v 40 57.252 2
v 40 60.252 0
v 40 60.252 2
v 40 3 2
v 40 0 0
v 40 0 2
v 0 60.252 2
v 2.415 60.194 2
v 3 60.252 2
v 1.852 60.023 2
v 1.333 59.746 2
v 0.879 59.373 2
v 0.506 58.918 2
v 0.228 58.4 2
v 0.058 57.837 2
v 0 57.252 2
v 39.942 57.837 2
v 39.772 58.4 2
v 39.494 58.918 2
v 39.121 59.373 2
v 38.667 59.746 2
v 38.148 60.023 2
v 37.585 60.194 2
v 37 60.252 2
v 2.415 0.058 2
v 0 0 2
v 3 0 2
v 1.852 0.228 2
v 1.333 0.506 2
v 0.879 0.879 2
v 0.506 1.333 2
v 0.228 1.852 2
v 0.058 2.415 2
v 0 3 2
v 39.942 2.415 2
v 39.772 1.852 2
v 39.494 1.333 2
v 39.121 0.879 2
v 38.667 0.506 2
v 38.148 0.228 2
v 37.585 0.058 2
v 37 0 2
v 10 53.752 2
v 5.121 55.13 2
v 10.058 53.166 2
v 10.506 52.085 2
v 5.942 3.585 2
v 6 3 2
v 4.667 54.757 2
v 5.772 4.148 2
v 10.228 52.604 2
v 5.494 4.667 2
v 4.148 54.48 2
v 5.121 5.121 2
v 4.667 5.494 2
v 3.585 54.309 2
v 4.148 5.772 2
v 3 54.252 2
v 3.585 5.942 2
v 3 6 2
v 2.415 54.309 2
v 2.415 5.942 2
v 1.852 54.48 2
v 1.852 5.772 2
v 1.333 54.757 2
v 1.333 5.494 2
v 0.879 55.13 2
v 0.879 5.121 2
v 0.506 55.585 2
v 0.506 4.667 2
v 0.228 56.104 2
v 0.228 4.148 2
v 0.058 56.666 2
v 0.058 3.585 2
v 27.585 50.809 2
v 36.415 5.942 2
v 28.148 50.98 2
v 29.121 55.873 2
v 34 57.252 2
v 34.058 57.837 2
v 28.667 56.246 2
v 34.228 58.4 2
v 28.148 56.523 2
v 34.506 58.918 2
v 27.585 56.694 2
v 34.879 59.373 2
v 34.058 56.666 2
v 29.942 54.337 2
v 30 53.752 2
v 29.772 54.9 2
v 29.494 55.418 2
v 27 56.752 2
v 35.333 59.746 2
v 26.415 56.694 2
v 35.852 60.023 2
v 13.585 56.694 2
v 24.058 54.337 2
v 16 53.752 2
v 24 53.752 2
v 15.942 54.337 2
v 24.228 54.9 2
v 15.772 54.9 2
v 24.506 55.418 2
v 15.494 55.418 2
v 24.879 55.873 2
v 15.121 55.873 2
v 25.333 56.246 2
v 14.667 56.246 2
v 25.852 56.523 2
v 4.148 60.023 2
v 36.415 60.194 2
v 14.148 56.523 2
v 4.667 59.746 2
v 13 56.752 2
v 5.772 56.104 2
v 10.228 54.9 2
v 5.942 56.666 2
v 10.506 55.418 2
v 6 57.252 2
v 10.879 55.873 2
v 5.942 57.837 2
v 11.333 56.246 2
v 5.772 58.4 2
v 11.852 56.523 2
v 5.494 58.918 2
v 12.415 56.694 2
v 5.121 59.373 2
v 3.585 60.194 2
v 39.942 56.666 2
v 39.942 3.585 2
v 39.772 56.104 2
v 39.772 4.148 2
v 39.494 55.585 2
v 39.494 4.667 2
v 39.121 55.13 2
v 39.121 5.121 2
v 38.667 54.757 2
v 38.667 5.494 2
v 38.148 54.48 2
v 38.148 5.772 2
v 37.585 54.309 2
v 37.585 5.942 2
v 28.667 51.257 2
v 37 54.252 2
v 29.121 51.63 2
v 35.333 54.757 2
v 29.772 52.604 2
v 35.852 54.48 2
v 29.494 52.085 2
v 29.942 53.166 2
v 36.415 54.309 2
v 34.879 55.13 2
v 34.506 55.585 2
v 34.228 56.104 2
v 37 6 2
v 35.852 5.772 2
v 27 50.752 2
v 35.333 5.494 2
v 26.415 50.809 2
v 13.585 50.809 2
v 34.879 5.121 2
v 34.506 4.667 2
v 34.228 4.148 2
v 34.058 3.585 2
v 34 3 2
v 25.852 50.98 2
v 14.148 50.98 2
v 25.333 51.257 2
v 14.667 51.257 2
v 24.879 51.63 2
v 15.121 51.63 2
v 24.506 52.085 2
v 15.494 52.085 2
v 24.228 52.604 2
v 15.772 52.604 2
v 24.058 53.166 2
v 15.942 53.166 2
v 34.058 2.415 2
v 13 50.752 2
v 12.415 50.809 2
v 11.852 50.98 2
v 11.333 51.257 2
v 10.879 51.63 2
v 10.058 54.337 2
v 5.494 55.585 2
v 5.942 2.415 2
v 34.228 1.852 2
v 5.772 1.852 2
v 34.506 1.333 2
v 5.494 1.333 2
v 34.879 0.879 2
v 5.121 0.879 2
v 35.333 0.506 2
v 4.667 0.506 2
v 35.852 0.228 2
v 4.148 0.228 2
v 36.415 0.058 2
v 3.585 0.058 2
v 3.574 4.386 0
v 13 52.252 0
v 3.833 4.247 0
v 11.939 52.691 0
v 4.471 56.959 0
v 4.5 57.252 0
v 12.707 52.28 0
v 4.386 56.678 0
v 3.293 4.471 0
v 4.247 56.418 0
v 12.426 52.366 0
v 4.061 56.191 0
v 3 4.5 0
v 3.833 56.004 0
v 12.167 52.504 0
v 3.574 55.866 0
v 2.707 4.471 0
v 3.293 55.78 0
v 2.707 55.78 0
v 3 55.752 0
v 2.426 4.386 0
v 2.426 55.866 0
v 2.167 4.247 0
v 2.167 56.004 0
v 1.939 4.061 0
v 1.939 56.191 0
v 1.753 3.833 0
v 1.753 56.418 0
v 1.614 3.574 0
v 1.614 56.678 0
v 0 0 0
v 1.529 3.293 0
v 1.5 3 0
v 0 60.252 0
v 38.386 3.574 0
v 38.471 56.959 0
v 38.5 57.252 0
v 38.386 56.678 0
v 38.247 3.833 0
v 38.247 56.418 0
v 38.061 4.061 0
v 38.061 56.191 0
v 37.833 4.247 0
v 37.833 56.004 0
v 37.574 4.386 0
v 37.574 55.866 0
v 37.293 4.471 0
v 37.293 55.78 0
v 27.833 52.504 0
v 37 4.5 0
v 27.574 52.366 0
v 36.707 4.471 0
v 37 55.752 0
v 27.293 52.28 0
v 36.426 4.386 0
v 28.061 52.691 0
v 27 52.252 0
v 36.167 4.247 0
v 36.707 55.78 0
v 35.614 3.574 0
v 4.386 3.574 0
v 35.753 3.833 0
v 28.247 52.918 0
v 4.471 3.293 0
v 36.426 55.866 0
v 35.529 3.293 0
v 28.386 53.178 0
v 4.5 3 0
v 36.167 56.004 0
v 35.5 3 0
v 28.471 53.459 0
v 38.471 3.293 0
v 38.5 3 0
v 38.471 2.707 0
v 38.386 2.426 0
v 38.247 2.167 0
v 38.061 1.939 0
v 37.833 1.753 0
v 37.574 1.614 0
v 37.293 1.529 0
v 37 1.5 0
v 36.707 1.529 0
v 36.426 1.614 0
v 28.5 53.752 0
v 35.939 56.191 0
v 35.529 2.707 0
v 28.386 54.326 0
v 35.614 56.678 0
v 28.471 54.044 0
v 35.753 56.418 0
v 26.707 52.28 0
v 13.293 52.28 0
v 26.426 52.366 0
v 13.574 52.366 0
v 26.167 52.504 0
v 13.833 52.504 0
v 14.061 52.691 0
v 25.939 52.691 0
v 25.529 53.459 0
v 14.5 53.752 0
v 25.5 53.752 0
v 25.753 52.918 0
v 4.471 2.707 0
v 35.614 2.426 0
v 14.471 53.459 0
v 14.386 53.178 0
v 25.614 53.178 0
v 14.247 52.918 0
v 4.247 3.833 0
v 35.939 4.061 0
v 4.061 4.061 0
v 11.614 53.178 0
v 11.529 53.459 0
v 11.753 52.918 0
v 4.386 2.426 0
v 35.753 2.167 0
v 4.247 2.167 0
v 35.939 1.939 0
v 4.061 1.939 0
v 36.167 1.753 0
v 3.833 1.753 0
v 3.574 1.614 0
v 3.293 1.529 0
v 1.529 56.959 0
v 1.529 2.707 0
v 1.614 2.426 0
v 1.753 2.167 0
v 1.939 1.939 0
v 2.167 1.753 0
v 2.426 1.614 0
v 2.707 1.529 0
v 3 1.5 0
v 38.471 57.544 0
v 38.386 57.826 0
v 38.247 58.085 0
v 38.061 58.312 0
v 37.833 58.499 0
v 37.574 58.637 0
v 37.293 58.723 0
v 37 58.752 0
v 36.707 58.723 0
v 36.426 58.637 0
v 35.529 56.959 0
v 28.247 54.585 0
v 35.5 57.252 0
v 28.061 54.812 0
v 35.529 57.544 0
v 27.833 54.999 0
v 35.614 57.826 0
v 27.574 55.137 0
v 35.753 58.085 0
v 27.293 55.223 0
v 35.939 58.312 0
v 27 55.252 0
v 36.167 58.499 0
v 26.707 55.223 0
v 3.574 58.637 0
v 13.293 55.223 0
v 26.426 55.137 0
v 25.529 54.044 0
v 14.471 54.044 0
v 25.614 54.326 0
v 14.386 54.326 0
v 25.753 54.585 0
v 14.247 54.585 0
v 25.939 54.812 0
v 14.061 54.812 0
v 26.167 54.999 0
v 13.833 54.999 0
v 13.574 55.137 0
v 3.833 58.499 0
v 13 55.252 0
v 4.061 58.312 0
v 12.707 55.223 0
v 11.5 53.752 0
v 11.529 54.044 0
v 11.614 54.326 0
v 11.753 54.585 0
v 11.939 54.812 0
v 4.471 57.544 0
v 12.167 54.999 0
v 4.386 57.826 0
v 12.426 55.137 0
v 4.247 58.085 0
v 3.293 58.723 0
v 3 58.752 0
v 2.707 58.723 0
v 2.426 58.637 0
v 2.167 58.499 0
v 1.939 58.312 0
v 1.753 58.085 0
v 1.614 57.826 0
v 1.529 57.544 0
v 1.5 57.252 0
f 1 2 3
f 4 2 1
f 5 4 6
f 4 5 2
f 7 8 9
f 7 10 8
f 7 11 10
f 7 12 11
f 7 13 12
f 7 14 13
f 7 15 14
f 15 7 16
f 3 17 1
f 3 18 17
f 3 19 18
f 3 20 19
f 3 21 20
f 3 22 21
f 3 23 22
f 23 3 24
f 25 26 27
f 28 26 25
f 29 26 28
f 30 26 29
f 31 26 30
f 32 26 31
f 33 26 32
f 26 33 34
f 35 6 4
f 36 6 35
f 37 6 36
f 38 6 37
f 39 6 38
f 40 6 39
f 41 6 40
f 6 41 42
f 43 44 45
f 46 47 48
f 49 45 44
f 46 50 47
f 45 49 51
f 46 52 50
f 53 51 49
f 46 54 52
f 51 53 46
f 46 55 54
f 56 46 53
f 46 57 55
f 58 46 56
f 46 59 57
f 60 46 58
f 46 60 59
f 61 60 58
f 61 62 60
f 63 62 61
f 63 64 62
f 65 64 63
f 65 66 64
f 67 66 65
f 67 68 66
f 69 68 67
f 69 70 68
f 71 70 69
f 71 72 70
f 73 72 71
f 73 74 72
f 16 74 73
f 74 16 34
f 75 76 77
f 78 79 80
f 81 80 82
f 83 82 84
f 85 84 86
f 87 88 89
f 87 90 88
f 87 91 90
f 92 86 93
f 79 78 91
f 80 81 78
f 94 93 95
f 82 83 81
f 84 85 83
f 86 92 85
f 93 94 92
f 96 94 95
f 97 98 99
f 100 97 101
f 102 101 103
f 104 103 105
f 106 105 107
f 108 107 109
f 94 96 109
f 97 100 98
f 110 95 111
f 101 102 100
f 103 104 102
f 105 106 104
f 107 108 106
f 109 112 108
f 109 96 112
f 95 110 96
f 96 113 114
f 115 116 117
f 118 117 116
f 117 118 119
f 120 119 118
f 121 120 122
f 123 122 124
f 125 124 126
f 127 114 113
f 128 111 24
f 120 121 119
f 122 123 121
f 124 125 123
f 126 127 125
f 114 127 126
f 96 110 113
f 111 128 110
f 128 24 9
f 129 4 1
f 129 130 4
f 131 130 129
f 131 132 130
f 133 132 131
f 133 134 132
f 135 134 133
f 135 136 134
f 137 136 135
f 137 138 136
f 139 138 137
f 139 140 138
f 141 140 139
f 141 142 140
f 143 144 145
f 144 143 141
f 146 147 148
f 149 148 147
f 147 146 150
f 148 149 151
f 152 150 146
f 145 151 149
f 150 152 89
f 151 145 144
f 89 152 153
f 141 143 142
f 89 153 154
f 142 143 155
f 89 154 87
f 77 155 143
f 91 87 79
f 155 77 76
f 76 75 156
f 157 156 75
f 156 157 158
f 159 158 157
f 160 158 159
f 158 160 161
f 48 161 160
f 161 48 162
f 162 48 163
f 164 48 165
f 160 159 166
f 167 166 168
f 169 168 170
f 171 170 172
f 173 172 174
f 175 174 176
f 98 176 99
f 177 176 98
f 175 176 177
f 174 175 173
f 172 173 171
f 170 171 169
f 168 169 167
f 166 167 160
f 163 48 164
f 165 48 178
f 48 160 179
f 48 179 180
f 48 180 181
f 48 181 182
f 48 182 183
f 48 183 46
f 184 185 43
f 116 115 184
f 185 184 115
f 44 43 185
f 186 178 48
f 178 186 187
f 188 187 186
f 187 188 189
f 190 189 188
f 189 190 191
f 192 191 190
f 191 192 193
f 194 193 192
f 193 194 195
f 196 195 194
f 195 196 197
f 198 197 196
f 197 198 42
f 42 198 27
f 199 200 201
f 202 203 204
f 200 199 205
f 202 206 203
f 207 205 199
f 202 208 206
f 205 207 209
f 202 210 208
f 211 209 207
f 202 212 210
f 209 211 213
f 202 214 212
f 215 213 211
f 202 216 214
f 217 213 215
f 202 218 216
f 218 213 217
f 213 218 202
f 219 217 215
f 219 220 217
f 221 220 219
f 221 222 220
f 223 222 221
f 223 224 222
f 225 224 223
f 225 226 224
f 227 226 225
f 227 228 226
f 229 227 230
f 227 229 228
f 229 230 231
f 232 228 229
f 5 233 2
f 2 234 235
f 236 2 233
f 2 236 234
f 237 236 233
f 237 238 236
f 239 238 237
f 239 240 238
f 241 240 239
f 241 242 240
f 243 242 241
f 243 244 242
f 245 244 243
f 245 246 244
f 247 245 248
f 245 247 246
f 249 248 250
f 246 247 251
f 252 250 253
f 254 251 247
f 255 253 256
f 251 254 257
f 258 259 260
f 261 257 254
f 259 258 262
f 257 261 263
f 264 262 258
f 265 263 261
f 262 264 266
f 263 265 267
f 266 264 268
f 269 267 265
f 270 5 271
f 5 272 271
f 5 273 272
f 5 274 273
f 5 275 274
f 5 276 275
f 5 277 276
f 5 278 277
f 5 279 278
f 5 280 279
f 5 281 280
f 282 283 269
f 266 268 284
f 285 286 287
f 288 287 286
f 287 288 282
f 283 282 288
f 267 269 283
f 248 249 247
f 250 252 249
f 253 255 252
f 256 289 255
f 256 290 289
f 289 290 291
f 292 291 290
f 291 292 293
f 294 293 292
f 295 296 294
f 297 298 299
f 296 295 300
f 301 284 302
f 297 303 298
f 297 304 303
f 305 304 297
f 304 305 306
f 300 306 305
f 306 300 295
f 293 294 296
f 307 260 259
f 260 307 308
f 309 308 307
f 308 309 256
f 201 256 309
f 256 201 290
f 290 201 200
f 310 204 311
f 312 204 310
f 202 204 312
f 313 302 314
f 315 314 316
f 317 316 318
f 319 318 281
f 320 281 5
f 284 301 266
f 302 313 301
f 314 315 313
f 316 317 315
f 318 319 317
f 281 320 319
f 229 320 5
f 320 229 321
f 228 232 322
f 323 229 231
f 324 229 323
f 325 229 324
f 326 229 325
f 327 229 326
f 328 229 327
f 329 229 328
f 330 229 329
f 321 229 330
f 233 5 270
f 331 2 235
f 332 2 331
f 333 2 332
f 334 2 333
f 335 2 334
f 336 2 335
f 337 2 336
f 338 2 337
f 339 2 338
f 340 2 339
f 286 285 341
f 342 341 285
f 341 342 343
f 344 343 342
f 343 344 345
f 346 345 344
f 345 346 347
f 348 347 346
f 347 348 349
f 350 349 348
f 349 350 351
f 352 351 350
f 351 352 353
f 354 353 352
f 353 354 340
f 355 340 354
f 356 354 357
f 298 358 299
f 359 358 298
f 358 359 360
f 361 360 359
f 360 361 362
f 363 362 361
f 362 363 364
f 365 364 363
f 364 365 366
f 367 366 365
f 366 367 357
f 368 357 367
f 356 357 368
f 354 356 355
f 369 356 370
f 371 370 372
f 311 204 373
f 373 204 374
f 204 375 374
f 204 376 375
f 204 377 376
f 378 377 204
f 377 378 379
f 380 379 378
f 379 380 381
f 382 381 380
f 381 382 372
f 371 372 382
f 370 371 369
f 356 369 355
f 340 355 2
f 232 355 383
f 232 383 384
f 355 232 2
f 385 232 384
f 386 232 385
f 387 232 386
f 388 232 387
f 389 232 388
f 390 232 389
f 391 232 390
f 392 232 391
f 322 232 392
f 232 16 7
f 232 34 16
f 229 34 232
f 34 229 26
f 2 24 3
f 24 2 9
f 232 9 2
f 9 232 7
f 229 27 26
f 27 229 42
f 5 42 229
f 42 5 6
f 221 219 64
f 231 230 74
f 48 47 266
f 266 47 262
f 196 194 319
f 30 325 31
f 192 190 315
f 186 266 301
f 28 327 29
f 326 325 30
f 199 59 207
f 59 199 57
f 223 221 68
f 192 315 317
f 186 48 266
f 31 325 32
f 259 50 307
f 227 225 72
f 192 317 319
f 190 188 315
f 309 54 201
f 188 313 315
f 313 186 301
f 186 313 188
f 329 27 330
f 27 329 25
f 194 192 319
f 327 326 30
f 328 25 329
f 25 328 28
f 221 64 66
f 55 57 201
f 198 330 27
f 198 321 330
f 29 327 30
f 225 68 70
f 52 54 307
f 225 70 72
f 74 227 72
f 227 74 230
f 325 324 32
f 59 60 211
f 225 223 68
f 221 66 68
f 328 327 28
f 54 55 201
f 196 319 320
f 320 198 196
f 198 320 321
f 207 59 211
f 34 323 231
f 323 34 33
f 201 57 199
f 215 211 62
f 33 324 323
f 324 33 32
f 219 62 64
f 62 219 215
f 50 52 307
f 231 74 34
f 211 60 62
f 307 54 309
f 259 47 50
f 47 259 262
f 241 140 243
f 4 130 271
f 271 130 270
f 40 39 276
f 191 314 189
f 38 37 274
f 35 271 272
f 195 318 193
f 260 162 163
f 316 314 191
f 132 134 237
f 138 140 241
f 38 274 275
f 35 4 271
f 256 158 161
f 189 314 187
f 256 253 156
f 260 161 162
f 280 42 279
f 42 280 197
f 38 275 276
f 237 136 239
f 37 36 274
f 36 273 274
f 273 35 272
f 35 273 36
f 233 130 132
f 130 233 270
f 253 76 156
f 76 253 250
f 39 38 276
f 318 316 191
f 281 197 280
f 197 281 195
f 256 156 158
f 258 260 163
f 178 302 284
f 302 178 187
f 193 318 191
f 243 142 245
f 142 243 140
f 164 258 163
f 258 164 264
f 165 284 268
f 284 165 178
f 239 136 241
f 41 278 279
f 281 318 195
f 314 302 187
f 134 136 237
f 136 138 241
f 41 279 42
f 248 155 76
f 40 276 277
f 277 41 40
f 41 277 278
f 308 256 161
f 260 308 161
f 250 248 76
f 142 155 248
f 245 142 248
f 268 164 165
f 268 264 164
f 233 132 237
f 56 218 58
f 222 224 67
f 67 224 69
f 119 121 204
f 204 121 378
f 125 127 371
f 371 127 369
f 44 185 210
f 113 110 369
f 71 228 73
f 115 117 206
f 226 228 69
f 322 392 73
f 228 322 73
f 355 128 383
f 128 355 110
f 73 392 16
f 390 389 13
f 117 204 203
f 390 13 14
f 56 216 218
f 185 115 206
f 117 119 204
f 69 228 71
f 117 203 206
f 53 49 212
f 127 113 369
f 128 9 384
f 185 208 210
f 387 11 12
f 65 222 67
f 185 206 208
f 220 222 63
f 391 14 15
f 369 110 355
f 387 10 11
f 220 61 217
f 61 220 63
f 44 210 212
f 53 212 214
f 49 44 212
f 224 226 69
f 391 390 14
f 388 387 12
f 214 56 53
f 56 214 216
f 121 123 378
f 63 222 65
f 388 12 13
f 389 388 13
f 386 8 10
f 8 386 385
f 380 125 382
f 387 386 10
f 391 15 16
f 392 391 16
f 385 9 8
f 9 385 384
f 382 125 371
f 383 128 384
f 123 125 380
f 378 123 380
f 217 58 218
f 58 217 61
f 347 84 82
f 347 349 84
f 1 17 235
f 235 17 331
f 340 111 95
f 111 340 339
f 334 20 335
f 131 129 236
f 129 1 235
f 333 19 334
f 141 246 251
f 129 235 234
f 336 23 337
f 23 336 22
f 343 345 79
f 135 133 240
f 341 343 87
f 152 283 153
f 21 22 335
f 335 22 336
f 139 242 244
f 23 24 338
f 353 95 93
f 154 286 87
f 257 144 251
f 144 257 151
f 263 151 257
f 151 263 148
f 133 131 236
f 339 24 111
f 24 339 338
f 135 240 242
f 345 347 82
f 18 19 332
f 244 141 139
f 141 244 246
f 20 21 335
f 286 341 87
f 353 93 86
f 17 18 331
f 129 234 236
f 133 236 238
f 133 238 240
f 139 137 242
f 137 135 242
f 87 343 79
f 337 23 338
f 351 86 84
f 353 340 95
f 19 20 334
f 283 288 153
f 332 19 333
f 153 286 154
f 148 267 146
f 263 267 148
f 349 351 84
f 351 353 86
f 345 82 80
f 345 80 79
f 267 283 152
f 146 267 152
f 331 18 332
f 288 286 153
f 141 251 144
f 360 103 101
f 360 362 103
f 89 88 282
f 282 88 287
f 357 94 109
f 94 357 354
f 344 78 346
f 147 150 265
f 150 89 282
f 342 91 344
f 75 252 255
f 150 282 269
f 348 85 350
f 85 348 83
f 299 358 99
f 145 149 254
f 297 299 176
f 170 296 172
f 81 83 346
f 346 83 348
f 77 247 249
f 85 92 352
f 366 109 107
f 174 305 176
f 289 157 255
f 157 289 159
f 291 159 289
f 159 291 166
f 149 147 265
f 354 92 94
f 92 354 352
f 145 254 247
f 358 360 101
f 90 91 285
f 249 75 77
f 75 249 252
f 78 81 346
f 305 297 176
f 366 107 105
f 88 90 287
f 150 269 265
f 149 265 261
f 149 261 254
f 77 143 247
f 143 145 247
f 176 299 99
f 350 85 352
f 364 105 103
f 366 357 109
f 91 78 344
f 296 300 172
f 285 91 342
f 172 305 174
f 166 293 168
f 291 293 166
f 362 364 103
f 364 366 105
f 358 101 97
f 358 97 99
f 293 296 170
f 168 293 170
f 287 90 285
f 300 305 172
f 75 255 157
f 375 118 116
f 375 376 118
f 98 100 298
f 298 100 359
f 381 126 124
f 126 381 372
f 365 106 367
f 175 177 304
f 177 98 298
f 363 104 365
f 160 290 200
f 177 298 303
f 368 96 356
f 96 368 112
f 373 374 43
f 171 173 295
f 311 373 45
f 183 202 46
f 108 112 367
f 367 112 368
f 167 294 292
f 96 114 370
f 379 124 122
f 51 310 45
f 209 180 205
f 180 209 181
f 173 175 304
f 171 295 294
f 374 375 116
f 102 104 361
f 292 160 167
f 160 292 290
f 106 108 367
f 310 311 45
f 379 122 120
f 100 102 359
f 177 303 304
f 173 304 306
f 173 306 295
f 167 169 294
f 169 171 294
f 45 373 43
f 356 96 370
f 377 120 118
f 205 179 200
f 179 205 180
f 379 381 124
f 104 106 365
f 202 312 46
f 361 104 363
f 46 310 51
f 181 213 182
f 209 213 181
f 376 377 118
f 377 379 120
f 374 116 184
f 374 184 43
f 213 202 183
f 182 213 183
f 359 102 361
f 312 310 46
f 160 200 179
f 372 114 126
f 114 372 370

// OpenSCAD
// digispark:
// 25x19x4
$fn=32;

t = 2;
h1 = 33 -t;
h2 = 38.5 -t;
l = 60;
w = 40;

button_dia = 23.8;
led_dia = 5;

screw_hole_dia = 3;
screw_hole_dist = 3;
screw_hole_len = 6;

pcb_screw_wall_dist = 3;
pcb_screw_dist = 14;

round_r = 5;

module prism(l, w, h){
   polyhedron(
           points=[[0,0,0], [l,0,0], [l,w,0], [0,w,0], [0,w,h], [l,w,h]],
           faces=[[0,1,2,3],[5,4,3,2],[0,4,5,1],[0,3,4],[5,2,1]]
           );
   }
   
module rounding(r, width) {
    translate([0,-r/2,-r/2])
    difference() {
        cube([width,r,r]);
        translate([0,r,r])
        rotate([0,90,0])
        cylinder(d=r, h=width);
    }
}
   
module case() { 
difference() {
    union() {
        difference() {
            union() {
                cube([w,l,h1]);
                translate([0,0,h1])
                       prism(w,l,  h2-h1);
            }       
            translate([w / 2, button_dia/2 + t + 1 + 5, 0])
                cylinder(h=t, d=button_dia);
            translate([w / 2, 45, 0])
                cylinder(h=t, d=led_dia);
            rounding(round_r, w);
            
            translate([w,l,0])
                rotate([0,0,180])
                    rounding(round_r, w);
            translate([w,0,0])
                rotate([0,0,90])
                    rounding(round_r, l);
            translate([0,l,0])
                rotate([0,0,-90])
                    rounding(round_r, l);
            
            translate([t,t,t])
                cube([w-2*t,l-2*t,h2]);
            
            translate([w/2-10/2,l-t,h2-(5+t)])
                cube([10, t, 5 + t]);
            }
            
        translate([0,0,h1-screw_hole_len]){
            cube([2*screw_hole_dist, 2*screw_hole_dist, screw_hole_len]);
            translate([0,2*screw_hole_dist,0])
            rotate([180,0,0])
            prism(2*screw_hole_dist,2*screw_hole_dist, 4);
        }
        translate([w-2*screw_hole_dist,0,h1-screw_hole_len]){
            cube([2*screw_hole_dist, 2*screw_hole_dist, screw_hole_len]);
            translate([0,2*screw_hole_dist,0])
            rotate([180,0,0])
            prism(2*screw_hole_dist,2*screw_hole_dist, 4);
        }
        translate([0,l-2*screw_hole_dist,h2-screw_hole_len-.6]){
            cube([2*screw_hole_dist, 2*screw_hole_dist, screw_hole_len]);
            translate([2*screw_hole_dist,0,0])
            rotate([180,0,180])
            prism(2*screw_hole_dist,2*screw_hole_dist, 4);
        }
        translate([w-2*screw_hole_dist,l-2*screw_hole_dist,h2-screw_hole_len-.6]){
            cube([2*screw_hole_dist, 2*screw_hole_dist, screw_hole_len]);
                        translate([2*screw_hole_dist,0,0])
            rotate([180,0,180])
            prism(2*screw_hole_dist,2*screw_hole_dist, 4);
        }
    }
    actual_screw_hole_len = screw_hole_len + 3;
    translate([screw_hole_dist,screw_hole_dist,h1-actual_screw_hole_len+.4])
        cylinder(d=screw_hole_dia, h=actual_screw_hole_len + 3);
    
    translate([w-screw_hole_dist,screw_hole_dist,h1-actual_screw_hole_len+.4])
        cylinder(d=screw_hole_dia, h=actual_screw_hole_len);
        
    translate([screw_hole_dist,l-screw_hole_dist,h2-actual_screw_hole_len+.4])
        cylinder(d=screw_hole_dia, h=actual_screw_hole_len);
        
    translate([w-screw_hole_dist,l-screw_hole_dist,h2-actual_screw_hole_len+.4])
        cylinder(d=screw_hole_dia, h=actual_screw_hole_len);
}
}

module lid() {
    l2 = sqrt(pow(l, 2) + pow(h2-h1, 2));
    
    difference(){
        cube([w,l2,t]);
        
        translate([screw_hole_dist,screw_hole_dist,0])
        cylinder(d1=screw_hole_dia, d2=screw_hole_dia*2, h=t);
        
        translate([w-screw_hole_dist,screw_hole_dist,0])
        cylinder(d1=screw_hole_dia, d2=screw_hole_dia*2, h=t);
        
        translate([screw_hole_dist,l2-screw_hole_dist,0])
        cylinder(d1=screw_hole_dia, d2=screw_hole_dia*2, h=t);
        
        translate([w-screw_hole_dist,l2-screw_hole_dist,0])
        cylinder(d1=screw_hole_dia, d2=screw_hole_dia*2, h=t);
        
        translate([w / 2 + pcb_screw_dist / 2, l2 - t - screw_hole_dia / 2 - pcb_screw_wall_dist, 0])
        cylinder(d1=screw_hole_dia, d2=screw_hole_dia*2, h=t);
        
        translate([w / 2 - pcb_screw_dist / 2, l2 - t - screw_hole_dia / 2 - pcb_screw_wall_dist, 0])
        cylinder(d1=screw_hole_dia, d2=screw_hole_dia*2, h=t);
    }
}

//case();

/*translate([0,0,h1])
rotate([atan((h2-h1)/l),0,0])*/
lid();
